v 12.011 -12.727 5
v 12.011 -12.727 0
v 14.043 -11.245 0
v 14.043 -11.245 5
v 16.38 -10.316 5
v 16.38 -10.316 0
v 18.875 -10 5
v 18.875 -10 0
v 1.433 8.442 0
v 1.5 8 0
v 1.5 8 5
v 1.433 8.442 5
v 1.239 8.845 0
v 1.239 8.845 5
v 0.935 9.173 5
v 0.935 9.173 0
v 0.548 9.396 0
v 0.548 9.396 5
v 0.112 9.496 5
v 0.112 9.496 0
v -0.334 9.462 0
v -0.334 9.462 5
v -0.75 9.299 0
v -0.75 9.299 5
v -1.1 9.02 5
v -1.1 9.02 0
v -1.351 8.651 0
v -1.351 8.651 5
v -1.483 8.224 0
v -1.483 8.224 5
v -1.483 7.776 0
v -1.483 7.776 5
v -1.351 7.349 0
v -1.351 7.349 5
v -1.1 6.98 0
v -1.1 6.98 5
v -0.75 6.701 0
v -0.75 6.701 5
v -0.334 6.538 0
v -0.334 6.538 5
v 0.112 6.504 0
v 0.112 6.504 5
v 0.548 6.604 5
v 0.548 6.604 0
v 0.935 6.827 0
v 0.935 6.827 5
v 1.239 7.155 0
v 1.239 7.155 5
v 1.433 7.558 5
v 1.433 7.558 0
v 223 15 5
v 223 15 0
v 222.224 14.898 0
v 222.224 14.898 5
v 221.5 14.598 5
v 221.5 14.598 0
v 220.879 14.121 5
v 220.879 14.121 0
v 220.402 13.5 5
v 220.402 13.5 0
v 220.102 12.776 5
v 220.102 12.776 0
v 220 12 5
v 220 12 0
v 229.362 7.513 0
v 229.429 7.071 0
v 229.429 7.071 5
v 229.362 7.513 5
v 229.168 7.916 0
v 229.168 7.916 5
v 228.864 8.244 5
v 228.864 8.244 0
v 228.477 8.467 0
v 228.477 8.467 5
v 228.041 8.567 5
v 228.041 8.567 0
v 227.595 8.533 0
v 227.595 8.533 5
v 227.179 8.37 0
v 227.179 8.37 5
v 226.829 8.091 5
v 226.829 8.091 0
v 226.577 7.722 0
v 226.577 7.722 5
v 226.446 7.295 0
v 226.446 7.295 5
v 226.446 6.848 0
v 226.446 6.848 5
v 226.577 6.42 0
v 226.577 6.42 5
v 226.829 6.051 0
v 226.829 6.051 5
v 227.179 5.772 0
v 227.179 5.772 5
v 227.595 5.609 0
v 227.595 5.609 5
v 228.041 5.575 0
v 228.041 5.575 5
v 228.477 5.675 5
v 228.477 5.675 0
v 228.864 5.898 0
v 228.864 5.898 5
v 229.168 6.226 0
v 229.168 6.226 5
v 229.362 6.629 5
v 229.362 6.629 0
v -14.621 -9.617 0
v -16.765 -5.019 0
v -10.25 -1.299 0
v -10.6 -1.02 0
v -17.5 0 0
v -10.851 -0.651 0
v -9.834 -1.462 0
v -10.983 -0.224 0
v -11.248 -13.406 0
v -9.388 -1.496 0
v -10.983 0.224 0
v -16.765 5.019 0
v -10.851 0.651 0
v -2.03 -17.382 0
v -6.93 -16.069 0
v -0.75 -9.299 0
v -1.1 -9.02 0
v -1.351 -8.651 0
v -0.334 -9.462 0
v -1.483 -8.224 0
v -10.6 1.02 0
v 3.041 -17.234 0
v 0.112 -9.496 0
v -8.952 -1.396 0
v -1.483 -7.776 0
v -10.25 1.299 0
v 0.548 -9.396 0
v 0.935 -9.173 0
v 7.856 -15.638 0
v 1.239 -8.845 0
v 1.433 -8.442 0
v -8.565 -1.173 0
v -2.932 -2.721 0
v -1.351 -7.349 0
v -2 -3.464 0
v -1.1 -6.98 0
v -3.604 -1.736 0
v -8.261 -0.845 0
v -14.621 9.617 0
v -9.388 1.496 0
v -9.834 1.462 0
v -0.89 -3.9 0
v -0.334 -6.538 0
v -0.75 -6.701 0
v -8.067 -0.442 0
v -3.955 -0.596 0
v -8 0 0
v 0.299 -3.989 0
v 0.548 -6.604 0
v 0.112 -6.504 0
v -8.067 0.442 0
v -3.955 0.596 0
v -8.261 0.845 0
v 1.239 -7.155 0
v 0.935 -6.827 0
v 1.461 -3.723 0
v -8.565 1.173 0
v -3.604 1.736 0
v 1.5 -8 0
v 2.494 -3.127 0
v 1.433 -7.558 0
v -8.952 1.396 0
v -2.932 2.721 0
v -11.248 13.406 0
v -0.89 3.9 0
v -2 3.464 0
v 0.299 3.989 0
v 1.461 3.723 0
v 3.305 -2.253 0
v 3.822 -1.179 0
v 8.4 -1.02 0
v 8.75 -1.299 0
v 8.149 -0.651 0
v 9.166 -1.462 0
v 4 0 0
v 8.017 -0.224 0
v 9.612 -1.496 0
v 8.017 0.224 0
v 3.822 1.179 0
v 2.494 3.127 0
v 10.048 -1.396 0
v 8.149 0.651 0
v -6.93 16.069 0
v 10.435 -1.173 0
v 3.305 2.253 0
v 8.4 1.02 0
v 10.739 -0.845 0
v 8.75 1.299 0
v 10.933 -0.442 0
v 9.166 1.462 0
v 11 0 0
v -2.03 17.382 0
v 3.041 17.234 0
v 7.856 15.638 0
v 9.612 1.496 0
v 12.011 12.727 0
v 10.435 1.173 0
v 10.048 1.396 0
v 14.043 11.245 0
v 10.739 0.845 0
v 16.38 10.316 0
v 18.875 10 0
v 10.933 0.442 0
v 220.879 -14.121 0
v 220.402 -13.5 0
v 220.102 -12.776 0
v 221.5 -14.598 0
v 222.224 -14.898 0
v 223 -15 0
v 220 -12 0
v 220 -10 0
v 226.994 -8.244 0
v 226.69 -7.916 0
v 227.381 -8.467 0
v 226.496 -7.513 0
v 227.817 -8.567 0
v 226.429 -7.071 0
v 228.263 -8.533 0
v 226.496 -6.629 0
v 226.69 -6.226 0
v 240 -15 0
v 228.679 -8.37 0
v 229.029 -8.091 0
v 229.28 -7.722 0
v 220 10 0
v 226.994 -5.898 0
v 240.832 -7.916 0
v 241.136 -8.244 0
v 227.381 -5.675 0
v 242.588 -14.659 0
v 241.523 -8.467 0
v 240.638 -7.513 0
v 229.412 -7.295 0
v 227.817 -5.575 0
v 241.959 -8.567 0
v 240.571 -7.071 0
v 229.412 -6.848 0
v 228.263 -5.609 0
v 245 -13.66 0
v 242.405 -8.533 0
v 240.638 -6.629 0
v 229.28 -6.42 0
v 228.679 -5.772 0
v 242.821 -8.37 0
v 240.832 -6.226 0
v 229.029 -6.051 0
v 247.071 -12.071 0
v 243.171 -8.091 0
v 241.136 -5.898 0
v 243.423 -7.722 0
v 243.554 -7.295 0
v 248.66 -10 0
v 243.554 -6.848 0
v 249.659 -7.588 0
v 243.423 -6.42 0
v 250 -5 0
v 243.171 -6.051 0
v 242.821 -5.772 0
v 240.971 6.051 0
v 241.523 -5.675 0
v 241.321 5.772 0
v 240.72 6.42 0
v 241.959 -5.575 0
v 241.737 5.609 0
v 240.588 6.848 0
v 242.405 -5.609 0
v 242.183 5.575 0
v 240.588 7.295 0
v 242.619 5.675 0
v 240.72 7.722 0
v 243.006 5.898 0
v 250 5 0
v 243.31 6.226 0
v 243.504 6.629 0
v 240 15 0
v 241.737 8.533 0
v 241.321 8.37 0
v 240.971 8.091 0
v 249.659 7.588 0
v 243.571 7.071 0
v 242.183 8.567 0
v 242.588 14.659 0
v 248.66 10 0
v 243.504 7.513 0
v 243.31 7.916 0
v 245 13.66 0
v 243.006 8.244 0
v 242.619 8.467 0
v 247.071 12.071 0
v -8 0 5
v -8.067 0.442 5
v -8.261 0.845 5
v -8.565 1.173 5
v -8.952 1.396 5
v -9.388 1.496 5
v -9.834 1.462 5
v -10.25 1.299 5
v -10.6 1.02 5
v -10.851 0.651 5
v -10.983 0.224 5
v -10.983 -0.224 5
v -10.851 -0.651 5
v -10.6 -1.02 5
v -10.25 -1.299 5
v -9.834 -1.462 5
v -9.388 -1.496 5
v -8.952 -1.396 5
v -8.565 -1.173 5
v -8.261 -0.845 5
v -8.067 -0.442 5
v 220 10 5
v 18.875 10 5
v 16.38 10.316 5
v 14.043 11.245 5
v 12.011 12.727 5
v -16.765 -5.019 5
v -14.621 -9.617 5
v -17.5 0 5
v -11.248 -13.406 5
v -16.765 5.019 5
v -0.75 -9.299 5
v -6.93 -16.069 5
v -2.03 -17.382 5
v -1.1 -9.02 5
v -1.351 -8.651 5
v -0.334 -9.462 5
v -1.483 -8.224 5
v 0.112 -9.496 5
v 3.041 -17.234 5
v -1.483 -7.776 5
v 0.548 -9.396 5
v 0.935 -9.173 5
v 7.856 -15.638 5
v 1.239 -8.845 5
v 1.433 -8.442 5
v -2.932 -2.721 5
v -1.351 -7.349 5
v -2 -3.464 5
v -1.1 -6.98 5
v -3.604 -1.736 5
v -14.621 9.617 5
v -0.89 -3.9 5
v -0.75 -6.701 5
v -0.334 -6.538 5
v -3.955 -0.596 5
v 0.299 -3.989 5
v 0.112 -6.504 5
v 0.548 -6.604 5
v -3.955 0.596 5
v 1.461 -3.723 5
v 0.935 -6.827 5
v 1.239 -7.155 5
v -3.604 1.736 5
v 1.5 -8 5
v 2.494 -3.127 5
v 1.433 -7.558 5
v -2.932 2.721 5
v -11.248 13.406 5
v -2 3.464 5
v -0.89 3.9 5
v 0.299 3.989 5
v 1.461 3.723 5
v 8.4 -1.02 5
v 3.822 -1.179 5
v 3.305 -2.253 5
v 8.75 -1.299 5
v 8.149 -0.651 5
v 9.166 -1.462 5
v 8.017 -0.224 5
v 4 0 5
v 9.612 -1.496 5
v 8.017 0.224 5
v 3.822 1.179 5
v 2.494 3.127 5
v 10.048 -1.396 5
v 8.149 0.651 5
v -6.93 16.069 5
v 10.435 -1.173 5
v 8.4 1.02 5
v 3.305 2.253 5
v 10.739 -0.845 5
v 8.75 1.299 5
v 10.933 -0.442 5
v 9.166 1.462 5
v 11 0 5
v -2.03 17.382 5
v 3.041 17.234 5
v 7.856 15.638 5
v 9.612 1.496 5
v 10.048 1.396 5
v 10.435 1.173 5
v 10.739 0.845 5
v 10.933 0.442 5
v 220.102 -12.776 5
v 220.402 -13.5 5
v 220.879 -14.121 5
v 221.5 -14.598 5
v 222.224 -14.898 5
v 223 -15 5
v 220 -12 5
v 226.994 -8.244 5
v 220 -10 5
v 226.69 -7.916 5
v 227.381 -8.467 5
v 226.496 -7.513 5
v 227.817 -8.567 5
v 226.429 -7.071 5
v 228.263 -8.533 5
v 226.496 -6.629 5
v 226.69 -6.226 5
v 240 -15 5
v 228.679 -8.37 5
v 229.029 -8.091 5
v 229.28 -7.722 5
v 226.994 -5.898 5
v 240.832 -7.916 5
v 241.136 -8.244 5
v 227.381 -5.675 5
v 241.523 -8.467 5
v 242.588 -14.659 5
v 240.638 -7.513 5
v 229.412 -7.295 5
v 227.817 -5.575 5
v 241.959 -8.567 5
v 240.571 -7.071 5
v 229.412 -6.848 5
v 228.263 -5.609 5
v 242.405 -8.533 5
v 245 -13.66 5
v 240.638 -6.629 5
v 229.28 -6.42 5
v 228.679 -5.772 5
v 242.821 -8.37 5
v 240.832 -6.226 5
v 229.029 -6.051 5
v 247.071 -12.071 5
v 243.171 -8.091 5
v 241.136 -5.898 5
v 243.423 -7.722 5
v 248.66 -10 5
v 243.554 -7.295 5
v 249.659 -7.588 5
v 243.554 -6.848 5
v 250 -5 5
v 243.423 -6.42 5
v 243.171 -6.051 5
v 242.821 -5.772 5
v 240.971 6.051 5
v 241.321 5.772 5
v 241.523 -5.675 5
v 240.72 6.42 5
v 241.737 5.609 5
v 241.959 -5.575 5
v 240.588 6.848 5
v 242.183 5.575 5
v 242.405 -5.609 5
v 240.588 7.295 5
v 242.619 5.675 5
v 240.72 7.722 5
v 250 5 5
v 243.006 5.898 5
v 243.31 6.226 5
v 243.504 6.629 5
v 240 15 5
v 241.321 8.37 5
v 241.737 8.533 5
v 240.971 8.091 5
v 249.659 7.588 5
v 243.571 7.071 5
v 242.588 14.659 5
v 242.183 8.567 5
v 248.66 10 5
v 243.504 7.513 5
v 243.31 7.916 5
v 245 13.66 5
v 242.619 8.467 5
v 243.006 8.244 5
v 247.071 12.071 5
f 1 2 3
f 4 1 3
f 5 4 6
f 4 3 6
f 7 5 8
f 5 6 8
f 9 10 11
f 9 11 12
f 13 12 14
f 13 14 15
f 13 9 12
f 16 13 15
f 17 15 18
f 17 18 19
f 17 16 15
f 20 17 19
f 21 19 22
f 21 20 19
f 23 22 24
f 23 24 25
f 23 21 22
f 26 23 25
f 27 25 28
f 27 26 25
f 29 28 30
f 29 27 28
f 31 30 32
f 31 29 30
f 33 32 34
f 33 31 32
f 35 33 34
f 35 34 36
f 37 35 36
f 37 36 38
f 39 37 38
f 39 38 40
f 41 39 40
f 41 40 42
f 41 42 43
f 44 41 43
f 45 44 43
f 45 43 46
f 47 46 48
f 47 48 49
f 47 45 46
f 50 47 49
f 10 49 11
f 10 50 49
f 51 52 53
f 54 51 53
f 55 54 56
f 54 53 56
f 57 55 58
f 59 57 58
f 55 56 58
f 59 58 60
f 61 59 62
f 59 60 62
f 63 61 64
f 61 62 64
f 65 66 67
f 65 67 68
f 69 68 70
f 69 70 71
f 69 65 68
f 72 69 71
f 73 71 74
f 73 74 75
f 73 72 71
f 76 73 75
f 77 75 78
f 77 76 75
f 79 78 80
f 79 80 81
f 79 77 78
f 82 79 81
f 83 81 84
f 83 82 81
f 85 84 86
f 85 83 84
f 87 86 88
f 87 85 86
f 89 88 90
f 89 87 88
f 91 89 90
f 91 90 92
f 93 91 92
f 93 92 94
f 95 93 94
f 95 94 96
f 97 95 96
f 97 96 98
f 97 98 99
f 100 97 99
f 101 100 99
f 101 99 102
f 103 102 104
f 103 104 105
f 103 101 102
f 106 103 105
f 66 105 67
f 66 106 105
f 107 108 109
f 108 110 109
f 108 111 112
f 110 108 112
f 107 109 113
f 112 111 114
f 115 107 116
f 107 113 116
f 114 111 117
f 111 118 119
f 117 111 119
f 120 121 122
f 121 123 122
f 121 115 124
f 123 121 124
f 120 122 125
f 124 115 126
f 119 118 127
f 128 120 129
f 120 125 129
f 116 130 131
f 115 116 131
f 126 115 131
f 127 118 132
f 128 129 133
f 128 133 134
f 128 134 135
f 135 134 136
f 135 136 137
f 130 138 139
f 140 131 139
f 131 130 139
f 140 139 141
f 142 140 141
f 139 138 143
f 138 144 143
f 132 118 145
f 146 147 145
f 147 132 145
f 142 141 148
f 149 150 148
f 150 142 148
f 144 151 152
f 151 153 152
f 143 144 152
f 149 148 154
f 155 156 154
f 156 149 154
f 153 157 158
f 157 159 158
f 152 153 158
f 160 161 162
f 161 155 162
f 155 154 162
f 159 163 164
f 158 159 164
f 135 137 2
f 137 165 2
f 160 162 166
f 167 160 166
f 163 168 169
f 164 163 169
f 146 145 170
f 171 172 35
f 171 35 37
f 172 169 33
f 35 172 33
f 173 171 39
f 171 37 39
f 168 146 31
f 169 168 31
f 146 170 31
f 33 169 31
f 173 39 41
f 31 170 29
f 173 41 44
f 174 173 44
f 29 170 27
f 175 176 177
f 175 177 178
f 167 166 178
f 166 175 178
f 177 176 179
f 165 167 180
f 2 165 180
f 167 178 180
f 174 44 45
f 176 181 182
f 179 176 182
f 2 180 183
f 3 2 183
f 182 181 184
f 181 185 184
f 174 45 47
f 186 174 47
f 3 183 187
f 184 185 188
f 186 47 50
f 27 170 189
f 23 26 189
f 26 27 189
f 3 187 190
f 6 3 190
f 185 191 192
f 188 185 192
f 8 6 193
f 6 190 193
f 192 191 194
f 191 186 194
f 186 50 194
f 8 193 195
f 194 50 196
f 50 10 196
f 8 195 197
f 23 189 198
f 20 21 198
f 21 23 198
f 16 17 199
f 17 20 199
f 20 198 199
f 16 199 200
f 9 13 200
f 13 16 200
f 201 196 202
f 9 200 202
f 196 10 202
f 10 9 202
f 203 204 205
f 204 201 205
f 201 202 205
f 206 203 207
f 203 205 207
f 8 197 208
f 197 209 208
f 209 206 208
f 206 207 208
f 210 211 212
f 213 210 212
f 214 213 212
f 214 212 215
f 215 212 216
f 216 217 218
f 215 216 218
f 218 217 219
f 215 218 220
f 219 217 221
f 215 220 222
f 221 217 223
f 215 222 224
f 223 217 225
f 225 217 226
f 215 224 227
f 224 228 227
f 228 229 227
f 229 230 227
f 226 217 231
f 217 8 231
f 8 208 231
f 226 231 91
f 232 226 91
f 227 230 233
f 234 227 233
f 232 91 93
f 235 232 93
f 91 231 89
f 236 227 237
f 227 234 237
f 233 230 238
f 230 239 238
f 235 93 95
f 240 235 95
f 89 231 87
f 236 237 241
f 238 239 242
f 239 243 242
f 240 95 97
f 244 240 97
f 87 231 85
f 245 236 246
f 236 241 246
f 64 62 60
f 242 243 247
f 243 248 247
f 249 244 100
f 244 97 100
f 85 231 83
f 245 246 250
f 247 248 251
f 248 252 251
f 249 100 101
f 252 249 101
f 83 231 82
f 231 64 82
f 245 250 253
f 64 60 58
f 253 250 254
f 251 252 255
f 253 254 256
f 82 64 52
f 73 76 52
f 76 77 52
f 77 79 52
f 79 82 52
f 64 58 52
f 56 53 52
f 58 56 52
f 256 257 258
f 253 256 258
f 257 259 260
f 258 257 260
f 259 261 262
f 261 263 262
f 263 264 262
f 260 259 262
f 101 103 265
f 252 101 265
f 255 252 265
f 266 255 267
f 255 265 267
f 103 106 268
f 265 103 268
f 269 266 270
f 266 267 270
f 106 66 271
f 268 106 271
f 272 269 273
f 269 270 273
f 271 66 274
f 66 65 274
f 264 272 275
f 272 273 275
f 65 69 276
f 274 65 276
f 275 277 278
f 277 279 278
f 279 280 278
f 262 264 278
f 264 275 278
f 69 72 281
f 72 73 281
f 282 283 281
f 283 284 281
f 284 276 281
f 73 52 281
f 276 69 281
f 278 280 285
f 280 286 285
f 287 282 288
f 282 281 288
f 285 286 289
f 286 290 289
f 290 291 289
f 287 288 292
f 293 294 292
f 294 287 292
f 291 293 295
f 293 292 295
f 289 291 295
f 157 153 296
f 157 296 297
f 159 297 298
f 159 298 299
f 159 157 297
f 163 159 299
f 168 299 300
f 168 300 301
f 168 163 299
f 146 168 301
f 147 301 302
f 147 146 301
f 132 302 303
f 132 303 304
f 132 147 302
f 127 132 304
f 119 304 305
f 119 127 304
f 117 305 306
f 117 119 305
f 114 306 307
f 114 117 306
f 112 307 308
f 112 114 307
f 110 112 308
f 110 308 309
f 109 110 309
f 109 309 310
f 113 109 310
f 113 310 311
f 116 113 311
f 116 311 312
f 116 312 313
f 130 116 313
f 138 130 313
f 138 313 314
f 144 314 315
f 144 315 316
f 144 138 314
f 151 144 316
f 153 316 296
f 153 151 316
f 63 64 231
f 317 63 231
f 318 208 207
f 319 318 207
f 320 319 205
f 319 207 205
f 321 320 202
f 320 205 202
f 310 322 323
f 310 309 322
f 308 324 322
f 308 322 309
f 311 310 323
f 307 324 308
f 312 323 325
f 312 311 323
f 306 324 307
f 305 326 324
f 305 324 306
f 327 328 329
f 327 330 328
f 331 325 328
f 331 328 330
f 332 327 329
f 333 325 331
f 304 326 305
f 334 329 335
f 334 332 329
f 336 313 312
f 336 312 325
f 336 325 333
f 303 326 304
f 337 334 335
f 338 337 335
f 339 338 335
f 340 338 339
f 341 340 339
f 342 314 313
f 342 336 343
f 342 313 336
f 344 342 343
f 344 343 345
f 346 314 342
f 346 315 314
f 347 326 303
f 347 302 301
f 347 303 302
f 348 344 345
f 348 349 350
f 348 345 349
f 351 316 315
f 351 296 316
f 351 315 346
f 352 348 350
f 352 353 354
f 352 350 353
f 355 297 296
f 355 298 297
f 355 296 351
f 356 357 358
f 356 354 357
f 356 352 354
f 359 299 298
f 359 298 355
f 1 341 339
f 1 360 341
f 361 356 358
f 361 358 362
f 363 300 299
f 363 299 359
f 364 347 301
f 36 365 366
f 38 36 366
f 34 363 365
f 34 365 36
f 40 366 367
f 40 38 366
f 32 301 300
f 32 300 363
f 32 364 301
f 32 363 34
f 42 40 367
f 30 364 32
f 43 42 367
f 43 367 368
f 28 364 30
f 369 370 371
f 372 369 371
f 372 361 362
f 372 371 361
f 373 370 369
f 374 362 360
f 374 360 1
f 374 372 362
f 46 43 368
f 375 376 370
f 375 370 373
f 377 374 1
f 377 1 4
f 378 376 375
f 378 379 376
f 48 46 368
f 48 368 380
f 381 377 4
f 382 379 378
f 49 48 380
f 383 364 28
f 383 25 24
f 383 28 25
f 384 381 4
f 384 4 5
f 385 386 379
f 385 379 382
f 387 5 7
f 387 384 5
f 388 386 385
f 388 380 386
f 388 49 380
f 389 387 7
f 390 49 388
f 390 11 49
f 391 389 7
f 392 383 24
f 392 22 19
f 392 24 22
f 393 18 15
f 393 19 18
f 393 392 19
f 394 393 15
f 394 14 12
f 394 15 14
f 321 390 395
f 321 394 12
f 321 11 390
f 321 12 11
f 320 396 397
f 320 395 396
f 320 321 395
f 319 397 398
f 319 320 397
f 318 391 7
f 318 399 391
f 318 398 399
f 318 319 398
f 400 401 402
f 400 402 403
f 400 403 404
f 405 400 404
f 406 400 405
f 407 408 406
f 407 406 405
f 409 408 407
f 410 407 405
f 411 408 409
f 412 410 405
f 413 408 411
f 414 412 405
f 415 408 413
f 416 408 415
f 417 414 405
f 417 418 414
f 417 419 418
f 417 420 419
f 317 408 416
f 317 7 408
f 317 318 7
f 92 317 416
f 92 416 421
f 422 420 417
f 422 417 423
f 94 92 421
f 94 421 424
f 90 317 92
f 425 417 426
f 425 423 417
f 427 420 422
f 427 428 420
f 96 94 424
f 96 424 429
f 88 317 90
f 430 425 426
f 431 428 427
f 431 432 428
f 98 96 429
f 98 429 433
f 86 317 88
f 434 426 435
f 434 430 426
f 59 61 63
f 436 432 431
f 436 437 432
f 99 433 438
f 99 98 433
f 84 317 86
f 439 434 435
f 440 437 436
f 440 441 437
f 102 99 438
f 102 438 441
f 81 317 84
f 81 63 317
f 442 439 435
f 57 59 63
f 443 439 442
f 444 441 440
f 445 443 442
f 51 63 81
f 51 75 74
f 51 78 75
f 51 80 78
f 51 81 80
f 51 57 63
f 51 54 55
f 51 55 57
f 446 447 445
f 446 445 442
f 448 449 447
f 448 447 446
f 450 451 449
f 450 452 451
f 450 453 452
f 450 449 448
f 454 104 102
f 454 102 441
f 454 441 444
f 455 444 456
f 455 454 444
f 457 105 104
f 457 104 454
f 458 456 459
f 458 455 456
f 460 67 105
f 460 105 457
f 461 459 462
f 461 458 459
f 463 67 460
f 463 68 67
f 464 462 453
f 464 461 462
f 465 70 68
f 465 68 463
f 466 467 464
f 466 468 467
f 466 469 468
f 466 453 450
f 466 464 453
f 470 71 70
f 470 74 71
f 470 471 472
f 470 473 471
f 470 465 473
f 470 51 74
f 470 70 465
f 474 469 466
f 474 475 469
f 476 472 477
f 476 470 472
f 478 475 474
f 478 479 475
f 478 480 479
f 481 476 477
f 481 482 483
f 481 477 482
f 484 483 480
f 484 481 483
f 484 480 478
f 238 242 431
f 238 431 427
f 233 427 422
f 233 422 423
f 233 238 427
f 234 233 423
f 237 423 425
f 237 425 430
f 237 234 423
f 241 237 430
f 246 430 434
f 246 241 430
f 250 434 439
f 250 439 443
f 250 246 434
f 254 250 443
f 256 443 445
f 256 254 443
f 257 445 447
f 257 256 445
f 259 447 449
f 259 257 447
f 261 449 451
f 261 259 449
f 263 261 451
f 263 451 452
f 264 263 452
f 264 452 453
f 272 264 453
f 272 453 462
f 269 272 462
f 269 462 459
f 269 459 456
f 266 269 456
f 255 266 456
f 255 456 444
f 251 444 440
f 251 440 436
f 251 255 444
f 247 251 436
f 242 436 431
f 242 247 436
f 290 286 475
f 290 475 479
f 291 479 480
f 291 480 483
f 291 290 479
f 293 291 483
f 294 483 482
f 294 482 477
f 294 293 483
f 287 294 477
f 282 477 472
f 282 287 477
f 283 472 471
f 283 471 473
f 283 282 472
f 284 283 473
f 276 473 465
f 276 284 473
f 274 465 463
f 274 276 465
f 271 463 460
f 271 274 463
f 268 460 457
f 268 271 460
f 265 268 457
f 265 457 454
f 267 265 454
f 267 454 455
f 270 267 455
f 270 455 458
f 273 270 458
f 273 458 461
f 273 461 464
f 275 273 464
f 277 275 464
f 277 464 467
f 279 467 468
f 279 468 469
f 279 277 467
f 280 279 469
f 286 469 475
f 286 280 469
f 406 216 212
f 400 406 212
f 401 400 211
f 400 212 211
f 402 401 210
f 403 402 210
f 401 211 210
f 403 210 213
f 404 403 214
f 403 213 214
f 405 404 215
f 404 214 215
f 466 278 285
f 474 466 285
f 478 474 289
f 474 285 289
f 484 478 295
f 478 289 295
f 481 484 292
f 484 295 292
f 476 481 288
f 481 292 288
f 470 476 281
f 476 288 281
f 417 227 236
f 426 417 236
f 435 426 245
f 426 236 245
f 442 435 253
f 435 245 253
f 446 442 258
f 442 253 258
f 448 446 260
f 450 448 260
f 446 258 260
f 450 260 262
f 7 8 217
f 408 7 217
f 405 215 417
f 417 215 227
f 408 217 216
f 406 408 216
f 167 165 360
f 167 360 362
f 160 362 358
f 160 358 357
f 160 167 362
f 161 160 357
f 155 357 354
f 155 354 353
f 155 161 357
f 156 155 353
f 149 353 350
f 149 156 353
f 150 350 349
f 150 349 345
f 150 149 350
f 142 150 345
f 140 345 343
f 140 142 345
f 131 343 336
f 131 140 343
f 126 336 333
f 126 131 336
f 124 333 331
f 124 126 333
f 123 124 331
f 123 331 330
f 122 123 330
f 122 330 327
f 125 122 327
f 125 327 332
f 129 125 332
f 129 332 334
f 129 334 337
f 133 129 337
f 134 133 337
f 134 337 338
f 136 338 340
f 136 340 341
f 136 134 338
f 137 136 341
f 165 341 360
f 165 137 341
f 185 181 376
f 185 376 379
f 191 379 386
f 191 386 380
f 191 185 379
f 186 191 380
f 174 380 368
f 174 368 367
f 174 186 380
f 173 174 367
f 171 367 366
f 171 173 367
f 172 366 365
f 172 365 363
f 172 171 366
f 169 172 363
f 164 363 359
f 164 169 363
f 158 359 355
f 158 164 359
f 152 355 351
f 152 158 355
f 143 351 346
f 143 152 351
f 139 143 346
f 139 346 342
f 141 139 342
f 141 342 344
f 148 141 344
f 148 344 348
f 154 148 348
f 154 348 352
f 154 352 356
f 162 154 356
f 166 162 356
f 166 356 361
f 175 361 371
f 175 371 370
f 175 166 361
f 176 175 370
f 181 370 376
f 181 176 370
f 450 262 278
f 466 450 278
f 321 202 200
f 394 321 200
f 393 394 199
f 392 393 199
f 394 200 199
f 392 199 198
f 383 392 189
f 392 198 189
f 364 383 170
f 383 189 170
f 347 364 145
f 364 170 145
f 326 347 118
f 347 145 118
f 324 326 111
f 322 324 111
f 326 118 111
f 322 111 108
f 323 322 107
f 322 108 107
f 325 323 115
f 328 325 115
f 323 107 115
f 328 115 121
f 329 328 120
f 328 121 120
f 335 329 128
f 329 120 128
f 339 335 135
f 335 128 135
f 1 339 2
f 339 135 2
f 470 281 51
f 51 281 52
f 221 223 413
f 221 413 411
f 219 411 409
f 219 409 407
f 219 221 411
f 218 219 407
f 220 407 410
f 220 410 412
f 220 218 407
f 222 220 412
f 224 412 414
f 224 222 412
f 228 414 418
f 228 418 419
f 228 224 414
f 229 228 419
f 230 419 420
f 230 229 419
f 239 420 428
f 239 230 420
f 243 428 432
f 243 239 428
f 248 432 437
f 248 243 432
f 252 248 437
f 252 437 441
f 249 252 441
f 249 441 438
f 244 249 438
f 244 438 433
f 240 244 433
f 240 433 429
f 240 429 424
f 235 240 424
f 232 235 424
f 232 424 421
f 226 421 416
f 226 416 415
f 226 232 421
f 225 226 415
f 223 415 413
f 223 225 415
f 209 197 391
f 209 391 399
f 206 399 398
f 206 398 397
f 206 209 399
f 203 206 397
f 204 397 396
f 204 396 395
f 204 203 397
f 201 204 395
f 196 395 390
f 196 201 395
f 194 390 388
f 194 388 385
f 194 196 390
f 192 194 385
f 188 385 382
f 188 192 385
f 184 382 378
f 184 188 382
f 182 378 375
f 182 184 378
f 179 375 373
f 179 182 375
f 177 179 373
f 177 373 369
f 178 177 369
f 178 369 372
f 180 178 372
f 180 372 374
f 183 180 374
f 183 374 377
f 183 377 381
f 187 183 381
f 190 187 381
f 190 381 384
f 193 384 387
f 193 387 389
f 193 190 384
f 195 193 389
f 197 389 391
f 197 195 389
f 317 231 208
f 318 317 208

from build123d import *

# Parameters (mm, degrees)
SKETCH1_R           = 4
SKETCH1_R_2         = 1.5
BOSS_EXTRUDE2_DEPTH = 5


with BuildPart() as part:
    # Sketch1 → Boss-Extrude2 (new body)
    with BuildSketch(Plane.XY):
        with BuildLine():
            Line((220, -10), (220, -12))
            ThreePointArc((220, -12), (220.878679656, -14.121320344), (223, -15))
            Line((223, -15), (240, -15))
            ThreePointArc((240, -15), (247.071067812, -12.071067812), (250, -5))
            Line((250, -5), (250, 5))
            ThreePointArc((250, 5), (247.071067812, 12.071067812), (240, 15))
            Line((240, 15), (223, 15))
            ThreePointArc((223, 15), (220.878679656, 14.121320344), (220, 12))
            Line((220, 12), (220, 10))
            Line((220, 10), (18.874586088, 10))
            ThreePointArc((18.874586088, 10), (15.181841359, 10.706796227), (12.011100238, 12.727272727))
            ThreePointArc((12.011100238, 12.727272727), (-17.5, 0), (12.011100238, -12.727272727))
            ThreePointArc((12.011100238, -12.727272727), (15.181841359, -10.706796227), (18.874586088, -10))
            Line((18.874586088, -10), (220, -10))
        make_face()
        Circle(SKETCH1_R, mode=Mode.SUBTRACT)
        with Locations((9.5, 0)):
            Circle(SKETCH1_R_2, mode=Mode.SUBTRACT)
        with Locations((-9.5, 0)):
            Circle(SKETCH1_R_2, mode=Mode.SUBTRACT)
        with Locations((0, 8)):
            Circle(SKETCH1_R_2, mode=Mode.SUBTRACT)
        with Locations((0, -8)):
            Circle(SKETCH1_R_2, mode=Mode.SUBTRACT)
        with Locations((227.928932188, 7.071067812)):
            Circle(SKETCH1_R_2, mode=Mode.SUBTRACT)
        with Locations(Location((242.071067812, -7.071067812, 0), (0, 0, 180))):
            Circle(SKETCH1_R_2, mode=Mode.SUBTRACT)
        with Locations((242.071067812, 7.071067812)):
            Circle(SKETCH1_R_2, mode=Mode.SUBTRACT)
        with Locations(Location((227.928932188, -7.071067812, 0), (0, 0, 180))):
            Circle(SKETCH1_R_2, mode=Mode.SUBTRACT)
    extrude(amount=BOSS_EXTRUDE2_DEPTH)


solid = part.part
